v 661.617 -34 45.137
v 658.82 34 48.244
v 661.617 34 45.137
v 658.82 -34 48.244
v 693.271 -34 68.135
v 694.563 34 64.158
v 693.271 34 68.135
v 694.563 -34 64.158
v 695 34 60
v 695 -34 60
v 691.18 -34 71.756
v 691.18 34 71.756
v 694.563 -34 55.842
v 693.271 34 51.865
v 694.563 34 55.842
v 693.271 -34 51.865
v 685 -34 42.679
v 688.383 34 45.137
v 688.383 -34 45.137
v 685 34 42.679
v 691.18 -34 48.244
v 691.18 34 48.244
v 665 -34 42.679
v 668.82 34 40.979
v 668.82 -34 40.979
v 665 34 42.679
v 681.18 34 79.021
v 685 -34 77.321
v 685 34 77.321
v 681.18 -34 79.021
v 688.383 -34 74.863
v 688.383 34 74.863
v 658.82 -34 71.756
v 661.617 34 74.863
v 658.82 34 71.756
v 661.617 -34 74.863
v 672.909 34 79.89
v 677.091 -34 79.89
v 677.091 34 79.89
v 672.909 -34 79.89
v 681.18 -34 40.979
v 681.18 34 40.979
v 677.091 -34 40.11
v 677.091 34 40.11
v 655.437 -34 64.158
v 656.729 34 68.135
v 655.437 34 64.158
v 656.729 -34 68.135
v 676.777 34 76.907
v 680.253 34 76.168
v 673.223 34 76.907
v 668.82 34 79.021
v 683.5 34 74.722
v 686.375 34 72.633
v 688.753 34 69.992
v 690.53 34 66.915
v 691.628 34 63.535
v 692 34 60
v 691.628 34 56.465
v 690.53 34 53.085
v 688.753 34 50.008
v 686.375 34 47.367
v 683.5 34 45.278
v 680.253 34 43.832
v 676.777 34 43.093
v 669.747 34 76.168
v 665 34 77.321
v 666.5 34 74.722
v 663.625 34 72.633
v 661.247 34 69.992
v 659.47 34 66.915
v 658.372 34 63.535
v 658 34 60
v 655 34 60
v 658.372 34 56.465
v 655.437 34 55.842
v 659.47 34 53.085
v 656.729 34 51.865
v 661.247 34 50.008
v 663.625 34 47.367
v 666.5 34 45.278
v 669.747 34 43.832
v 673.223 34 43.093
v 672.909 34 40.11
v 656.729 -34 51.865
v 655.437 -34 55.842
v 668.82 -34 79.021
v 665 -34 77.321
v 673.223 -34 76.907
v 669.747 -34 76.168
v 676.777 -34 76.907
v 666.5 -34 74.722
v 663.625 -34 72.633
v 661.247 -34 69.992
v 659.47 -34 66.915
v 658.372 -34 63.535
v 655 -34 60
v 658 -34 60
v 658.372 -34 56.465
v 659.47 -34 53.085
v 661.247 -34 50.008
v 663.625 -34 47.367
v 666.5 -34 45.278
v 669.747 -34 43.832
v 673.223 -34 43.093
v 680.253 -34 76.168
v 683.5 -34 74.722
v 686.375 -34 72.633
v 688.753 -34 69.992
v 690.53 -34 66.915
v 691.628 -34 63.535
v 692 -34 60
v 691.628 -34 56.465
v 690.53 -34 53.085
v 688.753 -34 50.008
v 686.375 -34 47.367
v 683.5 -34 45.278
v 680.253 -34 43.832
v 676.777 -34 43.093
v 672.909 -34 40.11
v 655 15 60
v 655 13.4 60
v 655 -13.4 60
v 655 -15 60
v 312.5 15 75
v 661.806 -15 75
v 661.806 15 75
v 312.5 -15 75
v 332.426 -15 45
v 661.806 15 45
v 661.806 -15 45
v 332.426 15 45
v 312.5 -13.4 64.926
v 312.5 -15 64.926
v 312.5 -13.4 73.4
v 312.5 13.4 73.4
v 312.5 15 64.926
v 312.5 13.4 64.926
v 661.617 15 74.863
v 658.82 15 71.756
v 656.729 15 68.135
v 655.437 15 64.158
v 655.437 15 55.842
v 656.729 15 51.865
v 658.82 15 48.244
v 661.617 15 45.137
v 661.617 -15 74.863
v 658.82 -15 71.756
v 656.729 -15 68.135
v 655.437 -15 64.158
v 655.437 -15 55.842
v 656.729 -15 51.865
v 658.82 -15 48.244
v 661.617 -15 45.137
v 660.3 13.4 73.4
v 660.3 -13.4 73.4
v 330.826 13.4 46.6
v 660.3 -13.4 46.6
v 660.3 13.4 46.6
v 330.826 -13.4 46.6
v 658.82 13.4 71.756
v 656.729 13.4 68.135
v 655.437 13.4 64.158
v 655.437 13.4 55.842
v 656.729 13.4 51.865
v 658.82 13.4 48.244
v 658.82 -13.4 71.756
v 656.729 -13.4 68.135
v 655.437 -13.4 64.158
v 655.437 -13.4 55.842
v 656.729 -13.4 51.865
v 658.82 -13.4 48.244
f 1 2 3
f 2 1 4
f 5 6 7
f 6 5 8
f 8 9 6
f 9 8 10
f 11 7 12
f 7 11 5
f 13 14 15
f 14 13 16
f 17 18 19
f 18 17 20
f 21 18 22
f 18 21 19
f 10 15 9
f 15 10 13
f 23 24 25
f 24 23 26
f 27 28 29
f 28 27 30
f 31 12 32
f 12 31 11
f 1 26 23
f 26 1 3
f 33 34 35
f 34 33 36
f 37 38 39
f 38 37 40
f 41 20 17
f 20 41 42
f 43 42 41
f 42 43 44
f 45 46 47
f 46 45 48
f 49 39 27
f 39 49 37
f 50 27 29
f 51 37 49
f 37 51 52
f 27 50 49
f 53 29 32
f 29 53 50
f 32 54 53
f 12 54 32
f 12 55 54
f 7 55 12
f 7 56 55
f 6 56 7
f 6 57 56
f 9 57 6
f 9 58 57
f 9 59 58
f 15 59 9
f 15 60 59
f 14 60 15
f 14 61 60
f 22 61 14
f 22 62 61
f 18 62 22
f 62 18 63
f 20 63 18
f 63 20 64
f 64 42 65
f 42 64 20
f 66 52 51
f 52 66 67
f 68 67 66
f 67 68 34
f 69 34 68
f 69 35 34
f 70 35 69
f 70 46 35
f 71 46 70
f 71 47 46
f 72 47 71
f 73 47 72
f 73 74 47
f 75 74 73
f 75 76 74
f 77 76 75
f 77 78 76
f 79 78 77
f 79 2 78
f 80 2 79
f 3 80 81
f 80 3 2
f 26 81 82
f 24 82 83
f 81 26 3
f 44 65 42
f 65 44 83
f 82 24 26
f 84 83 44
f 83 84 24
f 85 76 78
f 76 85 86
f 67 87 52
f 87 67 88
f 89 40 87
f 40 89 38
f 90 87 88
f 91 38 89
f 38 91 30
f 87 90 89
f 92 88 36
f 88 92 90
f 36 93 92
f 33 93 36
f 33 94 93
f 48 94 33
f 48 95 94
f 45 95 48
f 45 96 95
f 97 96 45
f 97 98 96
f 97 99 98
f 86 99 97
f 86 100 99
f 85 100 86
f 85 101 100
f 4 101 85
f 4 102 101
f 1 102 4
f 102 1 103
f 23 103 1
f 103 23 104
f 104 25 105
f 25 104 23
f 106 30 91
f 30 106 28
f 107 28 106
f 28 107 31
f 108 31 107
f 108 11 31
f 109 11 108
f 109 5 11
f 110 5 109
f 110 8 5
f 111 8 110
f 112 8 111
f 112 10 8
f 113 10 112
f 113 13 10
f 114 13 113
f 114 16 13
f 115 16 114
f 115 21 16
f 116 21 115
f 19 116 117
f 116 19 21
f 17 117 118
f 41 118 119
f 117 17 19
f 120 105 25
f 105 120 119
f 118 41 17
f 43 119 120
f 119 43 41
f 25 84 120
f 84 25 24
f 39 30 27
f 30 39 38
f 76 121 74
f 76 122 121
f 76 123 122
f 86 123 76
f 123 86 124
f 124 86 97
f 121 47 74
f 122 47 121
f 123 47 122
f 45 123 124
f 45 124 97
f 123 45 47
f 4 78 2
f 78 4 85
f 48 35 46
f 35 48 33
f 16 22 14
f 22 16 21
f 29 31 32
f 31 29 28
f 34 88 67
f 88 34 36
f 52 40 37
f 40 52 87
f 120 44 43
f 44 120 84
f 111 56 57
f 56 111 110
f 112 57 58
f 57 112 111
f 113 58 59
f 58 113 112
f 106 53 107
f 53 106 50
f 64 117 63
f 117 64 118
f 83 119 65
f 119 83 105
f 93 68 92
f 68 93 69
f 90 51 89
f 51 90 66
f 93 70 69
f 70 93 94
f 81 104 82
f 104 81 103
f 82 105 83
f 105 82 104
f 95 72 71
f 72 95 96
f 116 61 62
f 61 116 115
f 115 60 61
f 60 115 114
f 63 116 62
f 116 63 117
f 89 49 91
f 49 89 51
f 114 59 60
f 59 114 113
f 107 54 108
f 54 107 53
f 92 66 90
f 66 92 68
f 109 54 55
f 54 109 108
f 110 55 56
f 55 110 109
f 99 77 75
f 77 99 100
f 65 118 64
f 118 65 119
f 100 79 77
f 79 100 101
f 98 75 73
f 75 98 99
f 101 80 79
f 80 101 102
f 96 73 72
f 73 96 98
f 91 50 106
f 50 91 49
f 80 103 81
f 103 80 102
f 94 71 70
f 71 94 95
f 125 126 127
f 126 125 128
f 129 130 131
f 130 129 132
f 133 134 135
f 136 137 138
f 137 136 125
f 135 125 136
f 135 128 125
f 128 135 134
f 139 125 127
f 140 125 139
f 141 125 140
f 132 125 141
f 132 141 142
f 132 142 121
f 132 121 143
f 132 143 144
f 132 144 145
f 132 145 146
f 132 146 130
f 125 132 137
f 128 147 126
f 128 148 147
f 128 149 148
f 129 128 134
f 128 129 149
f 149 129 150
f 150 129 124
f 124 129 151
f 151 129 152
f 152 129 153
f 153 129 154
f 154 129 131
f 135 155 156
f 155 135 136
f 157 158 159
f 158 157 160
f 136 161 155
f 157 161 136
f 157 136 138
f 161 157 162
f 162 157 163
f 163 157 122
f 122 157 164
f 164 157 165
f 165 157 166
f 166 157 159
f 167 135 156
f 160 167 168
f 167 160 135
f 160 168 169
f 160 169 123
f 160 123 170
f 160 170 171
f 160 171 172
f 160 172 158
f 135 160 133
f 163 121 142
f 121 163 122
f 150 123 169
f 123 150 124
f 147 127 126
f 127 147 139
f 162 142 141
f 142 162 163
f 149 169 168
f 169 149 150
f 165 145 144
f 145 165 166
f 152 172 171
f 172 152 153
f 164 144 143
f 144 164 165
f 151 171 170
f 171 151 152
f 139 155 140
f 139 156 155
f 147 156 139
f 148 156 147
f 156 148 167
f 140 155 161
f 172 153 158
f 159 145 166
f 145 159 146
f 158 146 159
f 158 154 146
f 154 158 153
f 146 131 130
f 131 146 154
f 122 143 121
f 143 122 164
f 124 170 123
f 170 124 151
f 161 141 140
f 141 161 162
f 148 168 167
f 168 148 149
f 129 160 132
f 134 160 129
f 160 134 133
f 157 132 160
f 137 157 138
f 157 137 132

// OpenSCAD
frntBrkt();

module frntBrkt() color("silver"){
    translate([675,34,60]) rotate([90,0,0]) difference(){
        cylinder(r=20,h=68);
        translate([0,0,-1]) cylinder(r=17,h=70);
    }

    translate([500,0,60]) difference(){
        cube([375,30,30],center=true);
        cube([377,26.8,26.8],center=true);
        translate([175,35,0]) rotate([90,0,0]) cylinder(r=20,h=70);
        translate([-210,0,-15]) rotate([0,45,0]) cube(60,center=true);
    }
}
